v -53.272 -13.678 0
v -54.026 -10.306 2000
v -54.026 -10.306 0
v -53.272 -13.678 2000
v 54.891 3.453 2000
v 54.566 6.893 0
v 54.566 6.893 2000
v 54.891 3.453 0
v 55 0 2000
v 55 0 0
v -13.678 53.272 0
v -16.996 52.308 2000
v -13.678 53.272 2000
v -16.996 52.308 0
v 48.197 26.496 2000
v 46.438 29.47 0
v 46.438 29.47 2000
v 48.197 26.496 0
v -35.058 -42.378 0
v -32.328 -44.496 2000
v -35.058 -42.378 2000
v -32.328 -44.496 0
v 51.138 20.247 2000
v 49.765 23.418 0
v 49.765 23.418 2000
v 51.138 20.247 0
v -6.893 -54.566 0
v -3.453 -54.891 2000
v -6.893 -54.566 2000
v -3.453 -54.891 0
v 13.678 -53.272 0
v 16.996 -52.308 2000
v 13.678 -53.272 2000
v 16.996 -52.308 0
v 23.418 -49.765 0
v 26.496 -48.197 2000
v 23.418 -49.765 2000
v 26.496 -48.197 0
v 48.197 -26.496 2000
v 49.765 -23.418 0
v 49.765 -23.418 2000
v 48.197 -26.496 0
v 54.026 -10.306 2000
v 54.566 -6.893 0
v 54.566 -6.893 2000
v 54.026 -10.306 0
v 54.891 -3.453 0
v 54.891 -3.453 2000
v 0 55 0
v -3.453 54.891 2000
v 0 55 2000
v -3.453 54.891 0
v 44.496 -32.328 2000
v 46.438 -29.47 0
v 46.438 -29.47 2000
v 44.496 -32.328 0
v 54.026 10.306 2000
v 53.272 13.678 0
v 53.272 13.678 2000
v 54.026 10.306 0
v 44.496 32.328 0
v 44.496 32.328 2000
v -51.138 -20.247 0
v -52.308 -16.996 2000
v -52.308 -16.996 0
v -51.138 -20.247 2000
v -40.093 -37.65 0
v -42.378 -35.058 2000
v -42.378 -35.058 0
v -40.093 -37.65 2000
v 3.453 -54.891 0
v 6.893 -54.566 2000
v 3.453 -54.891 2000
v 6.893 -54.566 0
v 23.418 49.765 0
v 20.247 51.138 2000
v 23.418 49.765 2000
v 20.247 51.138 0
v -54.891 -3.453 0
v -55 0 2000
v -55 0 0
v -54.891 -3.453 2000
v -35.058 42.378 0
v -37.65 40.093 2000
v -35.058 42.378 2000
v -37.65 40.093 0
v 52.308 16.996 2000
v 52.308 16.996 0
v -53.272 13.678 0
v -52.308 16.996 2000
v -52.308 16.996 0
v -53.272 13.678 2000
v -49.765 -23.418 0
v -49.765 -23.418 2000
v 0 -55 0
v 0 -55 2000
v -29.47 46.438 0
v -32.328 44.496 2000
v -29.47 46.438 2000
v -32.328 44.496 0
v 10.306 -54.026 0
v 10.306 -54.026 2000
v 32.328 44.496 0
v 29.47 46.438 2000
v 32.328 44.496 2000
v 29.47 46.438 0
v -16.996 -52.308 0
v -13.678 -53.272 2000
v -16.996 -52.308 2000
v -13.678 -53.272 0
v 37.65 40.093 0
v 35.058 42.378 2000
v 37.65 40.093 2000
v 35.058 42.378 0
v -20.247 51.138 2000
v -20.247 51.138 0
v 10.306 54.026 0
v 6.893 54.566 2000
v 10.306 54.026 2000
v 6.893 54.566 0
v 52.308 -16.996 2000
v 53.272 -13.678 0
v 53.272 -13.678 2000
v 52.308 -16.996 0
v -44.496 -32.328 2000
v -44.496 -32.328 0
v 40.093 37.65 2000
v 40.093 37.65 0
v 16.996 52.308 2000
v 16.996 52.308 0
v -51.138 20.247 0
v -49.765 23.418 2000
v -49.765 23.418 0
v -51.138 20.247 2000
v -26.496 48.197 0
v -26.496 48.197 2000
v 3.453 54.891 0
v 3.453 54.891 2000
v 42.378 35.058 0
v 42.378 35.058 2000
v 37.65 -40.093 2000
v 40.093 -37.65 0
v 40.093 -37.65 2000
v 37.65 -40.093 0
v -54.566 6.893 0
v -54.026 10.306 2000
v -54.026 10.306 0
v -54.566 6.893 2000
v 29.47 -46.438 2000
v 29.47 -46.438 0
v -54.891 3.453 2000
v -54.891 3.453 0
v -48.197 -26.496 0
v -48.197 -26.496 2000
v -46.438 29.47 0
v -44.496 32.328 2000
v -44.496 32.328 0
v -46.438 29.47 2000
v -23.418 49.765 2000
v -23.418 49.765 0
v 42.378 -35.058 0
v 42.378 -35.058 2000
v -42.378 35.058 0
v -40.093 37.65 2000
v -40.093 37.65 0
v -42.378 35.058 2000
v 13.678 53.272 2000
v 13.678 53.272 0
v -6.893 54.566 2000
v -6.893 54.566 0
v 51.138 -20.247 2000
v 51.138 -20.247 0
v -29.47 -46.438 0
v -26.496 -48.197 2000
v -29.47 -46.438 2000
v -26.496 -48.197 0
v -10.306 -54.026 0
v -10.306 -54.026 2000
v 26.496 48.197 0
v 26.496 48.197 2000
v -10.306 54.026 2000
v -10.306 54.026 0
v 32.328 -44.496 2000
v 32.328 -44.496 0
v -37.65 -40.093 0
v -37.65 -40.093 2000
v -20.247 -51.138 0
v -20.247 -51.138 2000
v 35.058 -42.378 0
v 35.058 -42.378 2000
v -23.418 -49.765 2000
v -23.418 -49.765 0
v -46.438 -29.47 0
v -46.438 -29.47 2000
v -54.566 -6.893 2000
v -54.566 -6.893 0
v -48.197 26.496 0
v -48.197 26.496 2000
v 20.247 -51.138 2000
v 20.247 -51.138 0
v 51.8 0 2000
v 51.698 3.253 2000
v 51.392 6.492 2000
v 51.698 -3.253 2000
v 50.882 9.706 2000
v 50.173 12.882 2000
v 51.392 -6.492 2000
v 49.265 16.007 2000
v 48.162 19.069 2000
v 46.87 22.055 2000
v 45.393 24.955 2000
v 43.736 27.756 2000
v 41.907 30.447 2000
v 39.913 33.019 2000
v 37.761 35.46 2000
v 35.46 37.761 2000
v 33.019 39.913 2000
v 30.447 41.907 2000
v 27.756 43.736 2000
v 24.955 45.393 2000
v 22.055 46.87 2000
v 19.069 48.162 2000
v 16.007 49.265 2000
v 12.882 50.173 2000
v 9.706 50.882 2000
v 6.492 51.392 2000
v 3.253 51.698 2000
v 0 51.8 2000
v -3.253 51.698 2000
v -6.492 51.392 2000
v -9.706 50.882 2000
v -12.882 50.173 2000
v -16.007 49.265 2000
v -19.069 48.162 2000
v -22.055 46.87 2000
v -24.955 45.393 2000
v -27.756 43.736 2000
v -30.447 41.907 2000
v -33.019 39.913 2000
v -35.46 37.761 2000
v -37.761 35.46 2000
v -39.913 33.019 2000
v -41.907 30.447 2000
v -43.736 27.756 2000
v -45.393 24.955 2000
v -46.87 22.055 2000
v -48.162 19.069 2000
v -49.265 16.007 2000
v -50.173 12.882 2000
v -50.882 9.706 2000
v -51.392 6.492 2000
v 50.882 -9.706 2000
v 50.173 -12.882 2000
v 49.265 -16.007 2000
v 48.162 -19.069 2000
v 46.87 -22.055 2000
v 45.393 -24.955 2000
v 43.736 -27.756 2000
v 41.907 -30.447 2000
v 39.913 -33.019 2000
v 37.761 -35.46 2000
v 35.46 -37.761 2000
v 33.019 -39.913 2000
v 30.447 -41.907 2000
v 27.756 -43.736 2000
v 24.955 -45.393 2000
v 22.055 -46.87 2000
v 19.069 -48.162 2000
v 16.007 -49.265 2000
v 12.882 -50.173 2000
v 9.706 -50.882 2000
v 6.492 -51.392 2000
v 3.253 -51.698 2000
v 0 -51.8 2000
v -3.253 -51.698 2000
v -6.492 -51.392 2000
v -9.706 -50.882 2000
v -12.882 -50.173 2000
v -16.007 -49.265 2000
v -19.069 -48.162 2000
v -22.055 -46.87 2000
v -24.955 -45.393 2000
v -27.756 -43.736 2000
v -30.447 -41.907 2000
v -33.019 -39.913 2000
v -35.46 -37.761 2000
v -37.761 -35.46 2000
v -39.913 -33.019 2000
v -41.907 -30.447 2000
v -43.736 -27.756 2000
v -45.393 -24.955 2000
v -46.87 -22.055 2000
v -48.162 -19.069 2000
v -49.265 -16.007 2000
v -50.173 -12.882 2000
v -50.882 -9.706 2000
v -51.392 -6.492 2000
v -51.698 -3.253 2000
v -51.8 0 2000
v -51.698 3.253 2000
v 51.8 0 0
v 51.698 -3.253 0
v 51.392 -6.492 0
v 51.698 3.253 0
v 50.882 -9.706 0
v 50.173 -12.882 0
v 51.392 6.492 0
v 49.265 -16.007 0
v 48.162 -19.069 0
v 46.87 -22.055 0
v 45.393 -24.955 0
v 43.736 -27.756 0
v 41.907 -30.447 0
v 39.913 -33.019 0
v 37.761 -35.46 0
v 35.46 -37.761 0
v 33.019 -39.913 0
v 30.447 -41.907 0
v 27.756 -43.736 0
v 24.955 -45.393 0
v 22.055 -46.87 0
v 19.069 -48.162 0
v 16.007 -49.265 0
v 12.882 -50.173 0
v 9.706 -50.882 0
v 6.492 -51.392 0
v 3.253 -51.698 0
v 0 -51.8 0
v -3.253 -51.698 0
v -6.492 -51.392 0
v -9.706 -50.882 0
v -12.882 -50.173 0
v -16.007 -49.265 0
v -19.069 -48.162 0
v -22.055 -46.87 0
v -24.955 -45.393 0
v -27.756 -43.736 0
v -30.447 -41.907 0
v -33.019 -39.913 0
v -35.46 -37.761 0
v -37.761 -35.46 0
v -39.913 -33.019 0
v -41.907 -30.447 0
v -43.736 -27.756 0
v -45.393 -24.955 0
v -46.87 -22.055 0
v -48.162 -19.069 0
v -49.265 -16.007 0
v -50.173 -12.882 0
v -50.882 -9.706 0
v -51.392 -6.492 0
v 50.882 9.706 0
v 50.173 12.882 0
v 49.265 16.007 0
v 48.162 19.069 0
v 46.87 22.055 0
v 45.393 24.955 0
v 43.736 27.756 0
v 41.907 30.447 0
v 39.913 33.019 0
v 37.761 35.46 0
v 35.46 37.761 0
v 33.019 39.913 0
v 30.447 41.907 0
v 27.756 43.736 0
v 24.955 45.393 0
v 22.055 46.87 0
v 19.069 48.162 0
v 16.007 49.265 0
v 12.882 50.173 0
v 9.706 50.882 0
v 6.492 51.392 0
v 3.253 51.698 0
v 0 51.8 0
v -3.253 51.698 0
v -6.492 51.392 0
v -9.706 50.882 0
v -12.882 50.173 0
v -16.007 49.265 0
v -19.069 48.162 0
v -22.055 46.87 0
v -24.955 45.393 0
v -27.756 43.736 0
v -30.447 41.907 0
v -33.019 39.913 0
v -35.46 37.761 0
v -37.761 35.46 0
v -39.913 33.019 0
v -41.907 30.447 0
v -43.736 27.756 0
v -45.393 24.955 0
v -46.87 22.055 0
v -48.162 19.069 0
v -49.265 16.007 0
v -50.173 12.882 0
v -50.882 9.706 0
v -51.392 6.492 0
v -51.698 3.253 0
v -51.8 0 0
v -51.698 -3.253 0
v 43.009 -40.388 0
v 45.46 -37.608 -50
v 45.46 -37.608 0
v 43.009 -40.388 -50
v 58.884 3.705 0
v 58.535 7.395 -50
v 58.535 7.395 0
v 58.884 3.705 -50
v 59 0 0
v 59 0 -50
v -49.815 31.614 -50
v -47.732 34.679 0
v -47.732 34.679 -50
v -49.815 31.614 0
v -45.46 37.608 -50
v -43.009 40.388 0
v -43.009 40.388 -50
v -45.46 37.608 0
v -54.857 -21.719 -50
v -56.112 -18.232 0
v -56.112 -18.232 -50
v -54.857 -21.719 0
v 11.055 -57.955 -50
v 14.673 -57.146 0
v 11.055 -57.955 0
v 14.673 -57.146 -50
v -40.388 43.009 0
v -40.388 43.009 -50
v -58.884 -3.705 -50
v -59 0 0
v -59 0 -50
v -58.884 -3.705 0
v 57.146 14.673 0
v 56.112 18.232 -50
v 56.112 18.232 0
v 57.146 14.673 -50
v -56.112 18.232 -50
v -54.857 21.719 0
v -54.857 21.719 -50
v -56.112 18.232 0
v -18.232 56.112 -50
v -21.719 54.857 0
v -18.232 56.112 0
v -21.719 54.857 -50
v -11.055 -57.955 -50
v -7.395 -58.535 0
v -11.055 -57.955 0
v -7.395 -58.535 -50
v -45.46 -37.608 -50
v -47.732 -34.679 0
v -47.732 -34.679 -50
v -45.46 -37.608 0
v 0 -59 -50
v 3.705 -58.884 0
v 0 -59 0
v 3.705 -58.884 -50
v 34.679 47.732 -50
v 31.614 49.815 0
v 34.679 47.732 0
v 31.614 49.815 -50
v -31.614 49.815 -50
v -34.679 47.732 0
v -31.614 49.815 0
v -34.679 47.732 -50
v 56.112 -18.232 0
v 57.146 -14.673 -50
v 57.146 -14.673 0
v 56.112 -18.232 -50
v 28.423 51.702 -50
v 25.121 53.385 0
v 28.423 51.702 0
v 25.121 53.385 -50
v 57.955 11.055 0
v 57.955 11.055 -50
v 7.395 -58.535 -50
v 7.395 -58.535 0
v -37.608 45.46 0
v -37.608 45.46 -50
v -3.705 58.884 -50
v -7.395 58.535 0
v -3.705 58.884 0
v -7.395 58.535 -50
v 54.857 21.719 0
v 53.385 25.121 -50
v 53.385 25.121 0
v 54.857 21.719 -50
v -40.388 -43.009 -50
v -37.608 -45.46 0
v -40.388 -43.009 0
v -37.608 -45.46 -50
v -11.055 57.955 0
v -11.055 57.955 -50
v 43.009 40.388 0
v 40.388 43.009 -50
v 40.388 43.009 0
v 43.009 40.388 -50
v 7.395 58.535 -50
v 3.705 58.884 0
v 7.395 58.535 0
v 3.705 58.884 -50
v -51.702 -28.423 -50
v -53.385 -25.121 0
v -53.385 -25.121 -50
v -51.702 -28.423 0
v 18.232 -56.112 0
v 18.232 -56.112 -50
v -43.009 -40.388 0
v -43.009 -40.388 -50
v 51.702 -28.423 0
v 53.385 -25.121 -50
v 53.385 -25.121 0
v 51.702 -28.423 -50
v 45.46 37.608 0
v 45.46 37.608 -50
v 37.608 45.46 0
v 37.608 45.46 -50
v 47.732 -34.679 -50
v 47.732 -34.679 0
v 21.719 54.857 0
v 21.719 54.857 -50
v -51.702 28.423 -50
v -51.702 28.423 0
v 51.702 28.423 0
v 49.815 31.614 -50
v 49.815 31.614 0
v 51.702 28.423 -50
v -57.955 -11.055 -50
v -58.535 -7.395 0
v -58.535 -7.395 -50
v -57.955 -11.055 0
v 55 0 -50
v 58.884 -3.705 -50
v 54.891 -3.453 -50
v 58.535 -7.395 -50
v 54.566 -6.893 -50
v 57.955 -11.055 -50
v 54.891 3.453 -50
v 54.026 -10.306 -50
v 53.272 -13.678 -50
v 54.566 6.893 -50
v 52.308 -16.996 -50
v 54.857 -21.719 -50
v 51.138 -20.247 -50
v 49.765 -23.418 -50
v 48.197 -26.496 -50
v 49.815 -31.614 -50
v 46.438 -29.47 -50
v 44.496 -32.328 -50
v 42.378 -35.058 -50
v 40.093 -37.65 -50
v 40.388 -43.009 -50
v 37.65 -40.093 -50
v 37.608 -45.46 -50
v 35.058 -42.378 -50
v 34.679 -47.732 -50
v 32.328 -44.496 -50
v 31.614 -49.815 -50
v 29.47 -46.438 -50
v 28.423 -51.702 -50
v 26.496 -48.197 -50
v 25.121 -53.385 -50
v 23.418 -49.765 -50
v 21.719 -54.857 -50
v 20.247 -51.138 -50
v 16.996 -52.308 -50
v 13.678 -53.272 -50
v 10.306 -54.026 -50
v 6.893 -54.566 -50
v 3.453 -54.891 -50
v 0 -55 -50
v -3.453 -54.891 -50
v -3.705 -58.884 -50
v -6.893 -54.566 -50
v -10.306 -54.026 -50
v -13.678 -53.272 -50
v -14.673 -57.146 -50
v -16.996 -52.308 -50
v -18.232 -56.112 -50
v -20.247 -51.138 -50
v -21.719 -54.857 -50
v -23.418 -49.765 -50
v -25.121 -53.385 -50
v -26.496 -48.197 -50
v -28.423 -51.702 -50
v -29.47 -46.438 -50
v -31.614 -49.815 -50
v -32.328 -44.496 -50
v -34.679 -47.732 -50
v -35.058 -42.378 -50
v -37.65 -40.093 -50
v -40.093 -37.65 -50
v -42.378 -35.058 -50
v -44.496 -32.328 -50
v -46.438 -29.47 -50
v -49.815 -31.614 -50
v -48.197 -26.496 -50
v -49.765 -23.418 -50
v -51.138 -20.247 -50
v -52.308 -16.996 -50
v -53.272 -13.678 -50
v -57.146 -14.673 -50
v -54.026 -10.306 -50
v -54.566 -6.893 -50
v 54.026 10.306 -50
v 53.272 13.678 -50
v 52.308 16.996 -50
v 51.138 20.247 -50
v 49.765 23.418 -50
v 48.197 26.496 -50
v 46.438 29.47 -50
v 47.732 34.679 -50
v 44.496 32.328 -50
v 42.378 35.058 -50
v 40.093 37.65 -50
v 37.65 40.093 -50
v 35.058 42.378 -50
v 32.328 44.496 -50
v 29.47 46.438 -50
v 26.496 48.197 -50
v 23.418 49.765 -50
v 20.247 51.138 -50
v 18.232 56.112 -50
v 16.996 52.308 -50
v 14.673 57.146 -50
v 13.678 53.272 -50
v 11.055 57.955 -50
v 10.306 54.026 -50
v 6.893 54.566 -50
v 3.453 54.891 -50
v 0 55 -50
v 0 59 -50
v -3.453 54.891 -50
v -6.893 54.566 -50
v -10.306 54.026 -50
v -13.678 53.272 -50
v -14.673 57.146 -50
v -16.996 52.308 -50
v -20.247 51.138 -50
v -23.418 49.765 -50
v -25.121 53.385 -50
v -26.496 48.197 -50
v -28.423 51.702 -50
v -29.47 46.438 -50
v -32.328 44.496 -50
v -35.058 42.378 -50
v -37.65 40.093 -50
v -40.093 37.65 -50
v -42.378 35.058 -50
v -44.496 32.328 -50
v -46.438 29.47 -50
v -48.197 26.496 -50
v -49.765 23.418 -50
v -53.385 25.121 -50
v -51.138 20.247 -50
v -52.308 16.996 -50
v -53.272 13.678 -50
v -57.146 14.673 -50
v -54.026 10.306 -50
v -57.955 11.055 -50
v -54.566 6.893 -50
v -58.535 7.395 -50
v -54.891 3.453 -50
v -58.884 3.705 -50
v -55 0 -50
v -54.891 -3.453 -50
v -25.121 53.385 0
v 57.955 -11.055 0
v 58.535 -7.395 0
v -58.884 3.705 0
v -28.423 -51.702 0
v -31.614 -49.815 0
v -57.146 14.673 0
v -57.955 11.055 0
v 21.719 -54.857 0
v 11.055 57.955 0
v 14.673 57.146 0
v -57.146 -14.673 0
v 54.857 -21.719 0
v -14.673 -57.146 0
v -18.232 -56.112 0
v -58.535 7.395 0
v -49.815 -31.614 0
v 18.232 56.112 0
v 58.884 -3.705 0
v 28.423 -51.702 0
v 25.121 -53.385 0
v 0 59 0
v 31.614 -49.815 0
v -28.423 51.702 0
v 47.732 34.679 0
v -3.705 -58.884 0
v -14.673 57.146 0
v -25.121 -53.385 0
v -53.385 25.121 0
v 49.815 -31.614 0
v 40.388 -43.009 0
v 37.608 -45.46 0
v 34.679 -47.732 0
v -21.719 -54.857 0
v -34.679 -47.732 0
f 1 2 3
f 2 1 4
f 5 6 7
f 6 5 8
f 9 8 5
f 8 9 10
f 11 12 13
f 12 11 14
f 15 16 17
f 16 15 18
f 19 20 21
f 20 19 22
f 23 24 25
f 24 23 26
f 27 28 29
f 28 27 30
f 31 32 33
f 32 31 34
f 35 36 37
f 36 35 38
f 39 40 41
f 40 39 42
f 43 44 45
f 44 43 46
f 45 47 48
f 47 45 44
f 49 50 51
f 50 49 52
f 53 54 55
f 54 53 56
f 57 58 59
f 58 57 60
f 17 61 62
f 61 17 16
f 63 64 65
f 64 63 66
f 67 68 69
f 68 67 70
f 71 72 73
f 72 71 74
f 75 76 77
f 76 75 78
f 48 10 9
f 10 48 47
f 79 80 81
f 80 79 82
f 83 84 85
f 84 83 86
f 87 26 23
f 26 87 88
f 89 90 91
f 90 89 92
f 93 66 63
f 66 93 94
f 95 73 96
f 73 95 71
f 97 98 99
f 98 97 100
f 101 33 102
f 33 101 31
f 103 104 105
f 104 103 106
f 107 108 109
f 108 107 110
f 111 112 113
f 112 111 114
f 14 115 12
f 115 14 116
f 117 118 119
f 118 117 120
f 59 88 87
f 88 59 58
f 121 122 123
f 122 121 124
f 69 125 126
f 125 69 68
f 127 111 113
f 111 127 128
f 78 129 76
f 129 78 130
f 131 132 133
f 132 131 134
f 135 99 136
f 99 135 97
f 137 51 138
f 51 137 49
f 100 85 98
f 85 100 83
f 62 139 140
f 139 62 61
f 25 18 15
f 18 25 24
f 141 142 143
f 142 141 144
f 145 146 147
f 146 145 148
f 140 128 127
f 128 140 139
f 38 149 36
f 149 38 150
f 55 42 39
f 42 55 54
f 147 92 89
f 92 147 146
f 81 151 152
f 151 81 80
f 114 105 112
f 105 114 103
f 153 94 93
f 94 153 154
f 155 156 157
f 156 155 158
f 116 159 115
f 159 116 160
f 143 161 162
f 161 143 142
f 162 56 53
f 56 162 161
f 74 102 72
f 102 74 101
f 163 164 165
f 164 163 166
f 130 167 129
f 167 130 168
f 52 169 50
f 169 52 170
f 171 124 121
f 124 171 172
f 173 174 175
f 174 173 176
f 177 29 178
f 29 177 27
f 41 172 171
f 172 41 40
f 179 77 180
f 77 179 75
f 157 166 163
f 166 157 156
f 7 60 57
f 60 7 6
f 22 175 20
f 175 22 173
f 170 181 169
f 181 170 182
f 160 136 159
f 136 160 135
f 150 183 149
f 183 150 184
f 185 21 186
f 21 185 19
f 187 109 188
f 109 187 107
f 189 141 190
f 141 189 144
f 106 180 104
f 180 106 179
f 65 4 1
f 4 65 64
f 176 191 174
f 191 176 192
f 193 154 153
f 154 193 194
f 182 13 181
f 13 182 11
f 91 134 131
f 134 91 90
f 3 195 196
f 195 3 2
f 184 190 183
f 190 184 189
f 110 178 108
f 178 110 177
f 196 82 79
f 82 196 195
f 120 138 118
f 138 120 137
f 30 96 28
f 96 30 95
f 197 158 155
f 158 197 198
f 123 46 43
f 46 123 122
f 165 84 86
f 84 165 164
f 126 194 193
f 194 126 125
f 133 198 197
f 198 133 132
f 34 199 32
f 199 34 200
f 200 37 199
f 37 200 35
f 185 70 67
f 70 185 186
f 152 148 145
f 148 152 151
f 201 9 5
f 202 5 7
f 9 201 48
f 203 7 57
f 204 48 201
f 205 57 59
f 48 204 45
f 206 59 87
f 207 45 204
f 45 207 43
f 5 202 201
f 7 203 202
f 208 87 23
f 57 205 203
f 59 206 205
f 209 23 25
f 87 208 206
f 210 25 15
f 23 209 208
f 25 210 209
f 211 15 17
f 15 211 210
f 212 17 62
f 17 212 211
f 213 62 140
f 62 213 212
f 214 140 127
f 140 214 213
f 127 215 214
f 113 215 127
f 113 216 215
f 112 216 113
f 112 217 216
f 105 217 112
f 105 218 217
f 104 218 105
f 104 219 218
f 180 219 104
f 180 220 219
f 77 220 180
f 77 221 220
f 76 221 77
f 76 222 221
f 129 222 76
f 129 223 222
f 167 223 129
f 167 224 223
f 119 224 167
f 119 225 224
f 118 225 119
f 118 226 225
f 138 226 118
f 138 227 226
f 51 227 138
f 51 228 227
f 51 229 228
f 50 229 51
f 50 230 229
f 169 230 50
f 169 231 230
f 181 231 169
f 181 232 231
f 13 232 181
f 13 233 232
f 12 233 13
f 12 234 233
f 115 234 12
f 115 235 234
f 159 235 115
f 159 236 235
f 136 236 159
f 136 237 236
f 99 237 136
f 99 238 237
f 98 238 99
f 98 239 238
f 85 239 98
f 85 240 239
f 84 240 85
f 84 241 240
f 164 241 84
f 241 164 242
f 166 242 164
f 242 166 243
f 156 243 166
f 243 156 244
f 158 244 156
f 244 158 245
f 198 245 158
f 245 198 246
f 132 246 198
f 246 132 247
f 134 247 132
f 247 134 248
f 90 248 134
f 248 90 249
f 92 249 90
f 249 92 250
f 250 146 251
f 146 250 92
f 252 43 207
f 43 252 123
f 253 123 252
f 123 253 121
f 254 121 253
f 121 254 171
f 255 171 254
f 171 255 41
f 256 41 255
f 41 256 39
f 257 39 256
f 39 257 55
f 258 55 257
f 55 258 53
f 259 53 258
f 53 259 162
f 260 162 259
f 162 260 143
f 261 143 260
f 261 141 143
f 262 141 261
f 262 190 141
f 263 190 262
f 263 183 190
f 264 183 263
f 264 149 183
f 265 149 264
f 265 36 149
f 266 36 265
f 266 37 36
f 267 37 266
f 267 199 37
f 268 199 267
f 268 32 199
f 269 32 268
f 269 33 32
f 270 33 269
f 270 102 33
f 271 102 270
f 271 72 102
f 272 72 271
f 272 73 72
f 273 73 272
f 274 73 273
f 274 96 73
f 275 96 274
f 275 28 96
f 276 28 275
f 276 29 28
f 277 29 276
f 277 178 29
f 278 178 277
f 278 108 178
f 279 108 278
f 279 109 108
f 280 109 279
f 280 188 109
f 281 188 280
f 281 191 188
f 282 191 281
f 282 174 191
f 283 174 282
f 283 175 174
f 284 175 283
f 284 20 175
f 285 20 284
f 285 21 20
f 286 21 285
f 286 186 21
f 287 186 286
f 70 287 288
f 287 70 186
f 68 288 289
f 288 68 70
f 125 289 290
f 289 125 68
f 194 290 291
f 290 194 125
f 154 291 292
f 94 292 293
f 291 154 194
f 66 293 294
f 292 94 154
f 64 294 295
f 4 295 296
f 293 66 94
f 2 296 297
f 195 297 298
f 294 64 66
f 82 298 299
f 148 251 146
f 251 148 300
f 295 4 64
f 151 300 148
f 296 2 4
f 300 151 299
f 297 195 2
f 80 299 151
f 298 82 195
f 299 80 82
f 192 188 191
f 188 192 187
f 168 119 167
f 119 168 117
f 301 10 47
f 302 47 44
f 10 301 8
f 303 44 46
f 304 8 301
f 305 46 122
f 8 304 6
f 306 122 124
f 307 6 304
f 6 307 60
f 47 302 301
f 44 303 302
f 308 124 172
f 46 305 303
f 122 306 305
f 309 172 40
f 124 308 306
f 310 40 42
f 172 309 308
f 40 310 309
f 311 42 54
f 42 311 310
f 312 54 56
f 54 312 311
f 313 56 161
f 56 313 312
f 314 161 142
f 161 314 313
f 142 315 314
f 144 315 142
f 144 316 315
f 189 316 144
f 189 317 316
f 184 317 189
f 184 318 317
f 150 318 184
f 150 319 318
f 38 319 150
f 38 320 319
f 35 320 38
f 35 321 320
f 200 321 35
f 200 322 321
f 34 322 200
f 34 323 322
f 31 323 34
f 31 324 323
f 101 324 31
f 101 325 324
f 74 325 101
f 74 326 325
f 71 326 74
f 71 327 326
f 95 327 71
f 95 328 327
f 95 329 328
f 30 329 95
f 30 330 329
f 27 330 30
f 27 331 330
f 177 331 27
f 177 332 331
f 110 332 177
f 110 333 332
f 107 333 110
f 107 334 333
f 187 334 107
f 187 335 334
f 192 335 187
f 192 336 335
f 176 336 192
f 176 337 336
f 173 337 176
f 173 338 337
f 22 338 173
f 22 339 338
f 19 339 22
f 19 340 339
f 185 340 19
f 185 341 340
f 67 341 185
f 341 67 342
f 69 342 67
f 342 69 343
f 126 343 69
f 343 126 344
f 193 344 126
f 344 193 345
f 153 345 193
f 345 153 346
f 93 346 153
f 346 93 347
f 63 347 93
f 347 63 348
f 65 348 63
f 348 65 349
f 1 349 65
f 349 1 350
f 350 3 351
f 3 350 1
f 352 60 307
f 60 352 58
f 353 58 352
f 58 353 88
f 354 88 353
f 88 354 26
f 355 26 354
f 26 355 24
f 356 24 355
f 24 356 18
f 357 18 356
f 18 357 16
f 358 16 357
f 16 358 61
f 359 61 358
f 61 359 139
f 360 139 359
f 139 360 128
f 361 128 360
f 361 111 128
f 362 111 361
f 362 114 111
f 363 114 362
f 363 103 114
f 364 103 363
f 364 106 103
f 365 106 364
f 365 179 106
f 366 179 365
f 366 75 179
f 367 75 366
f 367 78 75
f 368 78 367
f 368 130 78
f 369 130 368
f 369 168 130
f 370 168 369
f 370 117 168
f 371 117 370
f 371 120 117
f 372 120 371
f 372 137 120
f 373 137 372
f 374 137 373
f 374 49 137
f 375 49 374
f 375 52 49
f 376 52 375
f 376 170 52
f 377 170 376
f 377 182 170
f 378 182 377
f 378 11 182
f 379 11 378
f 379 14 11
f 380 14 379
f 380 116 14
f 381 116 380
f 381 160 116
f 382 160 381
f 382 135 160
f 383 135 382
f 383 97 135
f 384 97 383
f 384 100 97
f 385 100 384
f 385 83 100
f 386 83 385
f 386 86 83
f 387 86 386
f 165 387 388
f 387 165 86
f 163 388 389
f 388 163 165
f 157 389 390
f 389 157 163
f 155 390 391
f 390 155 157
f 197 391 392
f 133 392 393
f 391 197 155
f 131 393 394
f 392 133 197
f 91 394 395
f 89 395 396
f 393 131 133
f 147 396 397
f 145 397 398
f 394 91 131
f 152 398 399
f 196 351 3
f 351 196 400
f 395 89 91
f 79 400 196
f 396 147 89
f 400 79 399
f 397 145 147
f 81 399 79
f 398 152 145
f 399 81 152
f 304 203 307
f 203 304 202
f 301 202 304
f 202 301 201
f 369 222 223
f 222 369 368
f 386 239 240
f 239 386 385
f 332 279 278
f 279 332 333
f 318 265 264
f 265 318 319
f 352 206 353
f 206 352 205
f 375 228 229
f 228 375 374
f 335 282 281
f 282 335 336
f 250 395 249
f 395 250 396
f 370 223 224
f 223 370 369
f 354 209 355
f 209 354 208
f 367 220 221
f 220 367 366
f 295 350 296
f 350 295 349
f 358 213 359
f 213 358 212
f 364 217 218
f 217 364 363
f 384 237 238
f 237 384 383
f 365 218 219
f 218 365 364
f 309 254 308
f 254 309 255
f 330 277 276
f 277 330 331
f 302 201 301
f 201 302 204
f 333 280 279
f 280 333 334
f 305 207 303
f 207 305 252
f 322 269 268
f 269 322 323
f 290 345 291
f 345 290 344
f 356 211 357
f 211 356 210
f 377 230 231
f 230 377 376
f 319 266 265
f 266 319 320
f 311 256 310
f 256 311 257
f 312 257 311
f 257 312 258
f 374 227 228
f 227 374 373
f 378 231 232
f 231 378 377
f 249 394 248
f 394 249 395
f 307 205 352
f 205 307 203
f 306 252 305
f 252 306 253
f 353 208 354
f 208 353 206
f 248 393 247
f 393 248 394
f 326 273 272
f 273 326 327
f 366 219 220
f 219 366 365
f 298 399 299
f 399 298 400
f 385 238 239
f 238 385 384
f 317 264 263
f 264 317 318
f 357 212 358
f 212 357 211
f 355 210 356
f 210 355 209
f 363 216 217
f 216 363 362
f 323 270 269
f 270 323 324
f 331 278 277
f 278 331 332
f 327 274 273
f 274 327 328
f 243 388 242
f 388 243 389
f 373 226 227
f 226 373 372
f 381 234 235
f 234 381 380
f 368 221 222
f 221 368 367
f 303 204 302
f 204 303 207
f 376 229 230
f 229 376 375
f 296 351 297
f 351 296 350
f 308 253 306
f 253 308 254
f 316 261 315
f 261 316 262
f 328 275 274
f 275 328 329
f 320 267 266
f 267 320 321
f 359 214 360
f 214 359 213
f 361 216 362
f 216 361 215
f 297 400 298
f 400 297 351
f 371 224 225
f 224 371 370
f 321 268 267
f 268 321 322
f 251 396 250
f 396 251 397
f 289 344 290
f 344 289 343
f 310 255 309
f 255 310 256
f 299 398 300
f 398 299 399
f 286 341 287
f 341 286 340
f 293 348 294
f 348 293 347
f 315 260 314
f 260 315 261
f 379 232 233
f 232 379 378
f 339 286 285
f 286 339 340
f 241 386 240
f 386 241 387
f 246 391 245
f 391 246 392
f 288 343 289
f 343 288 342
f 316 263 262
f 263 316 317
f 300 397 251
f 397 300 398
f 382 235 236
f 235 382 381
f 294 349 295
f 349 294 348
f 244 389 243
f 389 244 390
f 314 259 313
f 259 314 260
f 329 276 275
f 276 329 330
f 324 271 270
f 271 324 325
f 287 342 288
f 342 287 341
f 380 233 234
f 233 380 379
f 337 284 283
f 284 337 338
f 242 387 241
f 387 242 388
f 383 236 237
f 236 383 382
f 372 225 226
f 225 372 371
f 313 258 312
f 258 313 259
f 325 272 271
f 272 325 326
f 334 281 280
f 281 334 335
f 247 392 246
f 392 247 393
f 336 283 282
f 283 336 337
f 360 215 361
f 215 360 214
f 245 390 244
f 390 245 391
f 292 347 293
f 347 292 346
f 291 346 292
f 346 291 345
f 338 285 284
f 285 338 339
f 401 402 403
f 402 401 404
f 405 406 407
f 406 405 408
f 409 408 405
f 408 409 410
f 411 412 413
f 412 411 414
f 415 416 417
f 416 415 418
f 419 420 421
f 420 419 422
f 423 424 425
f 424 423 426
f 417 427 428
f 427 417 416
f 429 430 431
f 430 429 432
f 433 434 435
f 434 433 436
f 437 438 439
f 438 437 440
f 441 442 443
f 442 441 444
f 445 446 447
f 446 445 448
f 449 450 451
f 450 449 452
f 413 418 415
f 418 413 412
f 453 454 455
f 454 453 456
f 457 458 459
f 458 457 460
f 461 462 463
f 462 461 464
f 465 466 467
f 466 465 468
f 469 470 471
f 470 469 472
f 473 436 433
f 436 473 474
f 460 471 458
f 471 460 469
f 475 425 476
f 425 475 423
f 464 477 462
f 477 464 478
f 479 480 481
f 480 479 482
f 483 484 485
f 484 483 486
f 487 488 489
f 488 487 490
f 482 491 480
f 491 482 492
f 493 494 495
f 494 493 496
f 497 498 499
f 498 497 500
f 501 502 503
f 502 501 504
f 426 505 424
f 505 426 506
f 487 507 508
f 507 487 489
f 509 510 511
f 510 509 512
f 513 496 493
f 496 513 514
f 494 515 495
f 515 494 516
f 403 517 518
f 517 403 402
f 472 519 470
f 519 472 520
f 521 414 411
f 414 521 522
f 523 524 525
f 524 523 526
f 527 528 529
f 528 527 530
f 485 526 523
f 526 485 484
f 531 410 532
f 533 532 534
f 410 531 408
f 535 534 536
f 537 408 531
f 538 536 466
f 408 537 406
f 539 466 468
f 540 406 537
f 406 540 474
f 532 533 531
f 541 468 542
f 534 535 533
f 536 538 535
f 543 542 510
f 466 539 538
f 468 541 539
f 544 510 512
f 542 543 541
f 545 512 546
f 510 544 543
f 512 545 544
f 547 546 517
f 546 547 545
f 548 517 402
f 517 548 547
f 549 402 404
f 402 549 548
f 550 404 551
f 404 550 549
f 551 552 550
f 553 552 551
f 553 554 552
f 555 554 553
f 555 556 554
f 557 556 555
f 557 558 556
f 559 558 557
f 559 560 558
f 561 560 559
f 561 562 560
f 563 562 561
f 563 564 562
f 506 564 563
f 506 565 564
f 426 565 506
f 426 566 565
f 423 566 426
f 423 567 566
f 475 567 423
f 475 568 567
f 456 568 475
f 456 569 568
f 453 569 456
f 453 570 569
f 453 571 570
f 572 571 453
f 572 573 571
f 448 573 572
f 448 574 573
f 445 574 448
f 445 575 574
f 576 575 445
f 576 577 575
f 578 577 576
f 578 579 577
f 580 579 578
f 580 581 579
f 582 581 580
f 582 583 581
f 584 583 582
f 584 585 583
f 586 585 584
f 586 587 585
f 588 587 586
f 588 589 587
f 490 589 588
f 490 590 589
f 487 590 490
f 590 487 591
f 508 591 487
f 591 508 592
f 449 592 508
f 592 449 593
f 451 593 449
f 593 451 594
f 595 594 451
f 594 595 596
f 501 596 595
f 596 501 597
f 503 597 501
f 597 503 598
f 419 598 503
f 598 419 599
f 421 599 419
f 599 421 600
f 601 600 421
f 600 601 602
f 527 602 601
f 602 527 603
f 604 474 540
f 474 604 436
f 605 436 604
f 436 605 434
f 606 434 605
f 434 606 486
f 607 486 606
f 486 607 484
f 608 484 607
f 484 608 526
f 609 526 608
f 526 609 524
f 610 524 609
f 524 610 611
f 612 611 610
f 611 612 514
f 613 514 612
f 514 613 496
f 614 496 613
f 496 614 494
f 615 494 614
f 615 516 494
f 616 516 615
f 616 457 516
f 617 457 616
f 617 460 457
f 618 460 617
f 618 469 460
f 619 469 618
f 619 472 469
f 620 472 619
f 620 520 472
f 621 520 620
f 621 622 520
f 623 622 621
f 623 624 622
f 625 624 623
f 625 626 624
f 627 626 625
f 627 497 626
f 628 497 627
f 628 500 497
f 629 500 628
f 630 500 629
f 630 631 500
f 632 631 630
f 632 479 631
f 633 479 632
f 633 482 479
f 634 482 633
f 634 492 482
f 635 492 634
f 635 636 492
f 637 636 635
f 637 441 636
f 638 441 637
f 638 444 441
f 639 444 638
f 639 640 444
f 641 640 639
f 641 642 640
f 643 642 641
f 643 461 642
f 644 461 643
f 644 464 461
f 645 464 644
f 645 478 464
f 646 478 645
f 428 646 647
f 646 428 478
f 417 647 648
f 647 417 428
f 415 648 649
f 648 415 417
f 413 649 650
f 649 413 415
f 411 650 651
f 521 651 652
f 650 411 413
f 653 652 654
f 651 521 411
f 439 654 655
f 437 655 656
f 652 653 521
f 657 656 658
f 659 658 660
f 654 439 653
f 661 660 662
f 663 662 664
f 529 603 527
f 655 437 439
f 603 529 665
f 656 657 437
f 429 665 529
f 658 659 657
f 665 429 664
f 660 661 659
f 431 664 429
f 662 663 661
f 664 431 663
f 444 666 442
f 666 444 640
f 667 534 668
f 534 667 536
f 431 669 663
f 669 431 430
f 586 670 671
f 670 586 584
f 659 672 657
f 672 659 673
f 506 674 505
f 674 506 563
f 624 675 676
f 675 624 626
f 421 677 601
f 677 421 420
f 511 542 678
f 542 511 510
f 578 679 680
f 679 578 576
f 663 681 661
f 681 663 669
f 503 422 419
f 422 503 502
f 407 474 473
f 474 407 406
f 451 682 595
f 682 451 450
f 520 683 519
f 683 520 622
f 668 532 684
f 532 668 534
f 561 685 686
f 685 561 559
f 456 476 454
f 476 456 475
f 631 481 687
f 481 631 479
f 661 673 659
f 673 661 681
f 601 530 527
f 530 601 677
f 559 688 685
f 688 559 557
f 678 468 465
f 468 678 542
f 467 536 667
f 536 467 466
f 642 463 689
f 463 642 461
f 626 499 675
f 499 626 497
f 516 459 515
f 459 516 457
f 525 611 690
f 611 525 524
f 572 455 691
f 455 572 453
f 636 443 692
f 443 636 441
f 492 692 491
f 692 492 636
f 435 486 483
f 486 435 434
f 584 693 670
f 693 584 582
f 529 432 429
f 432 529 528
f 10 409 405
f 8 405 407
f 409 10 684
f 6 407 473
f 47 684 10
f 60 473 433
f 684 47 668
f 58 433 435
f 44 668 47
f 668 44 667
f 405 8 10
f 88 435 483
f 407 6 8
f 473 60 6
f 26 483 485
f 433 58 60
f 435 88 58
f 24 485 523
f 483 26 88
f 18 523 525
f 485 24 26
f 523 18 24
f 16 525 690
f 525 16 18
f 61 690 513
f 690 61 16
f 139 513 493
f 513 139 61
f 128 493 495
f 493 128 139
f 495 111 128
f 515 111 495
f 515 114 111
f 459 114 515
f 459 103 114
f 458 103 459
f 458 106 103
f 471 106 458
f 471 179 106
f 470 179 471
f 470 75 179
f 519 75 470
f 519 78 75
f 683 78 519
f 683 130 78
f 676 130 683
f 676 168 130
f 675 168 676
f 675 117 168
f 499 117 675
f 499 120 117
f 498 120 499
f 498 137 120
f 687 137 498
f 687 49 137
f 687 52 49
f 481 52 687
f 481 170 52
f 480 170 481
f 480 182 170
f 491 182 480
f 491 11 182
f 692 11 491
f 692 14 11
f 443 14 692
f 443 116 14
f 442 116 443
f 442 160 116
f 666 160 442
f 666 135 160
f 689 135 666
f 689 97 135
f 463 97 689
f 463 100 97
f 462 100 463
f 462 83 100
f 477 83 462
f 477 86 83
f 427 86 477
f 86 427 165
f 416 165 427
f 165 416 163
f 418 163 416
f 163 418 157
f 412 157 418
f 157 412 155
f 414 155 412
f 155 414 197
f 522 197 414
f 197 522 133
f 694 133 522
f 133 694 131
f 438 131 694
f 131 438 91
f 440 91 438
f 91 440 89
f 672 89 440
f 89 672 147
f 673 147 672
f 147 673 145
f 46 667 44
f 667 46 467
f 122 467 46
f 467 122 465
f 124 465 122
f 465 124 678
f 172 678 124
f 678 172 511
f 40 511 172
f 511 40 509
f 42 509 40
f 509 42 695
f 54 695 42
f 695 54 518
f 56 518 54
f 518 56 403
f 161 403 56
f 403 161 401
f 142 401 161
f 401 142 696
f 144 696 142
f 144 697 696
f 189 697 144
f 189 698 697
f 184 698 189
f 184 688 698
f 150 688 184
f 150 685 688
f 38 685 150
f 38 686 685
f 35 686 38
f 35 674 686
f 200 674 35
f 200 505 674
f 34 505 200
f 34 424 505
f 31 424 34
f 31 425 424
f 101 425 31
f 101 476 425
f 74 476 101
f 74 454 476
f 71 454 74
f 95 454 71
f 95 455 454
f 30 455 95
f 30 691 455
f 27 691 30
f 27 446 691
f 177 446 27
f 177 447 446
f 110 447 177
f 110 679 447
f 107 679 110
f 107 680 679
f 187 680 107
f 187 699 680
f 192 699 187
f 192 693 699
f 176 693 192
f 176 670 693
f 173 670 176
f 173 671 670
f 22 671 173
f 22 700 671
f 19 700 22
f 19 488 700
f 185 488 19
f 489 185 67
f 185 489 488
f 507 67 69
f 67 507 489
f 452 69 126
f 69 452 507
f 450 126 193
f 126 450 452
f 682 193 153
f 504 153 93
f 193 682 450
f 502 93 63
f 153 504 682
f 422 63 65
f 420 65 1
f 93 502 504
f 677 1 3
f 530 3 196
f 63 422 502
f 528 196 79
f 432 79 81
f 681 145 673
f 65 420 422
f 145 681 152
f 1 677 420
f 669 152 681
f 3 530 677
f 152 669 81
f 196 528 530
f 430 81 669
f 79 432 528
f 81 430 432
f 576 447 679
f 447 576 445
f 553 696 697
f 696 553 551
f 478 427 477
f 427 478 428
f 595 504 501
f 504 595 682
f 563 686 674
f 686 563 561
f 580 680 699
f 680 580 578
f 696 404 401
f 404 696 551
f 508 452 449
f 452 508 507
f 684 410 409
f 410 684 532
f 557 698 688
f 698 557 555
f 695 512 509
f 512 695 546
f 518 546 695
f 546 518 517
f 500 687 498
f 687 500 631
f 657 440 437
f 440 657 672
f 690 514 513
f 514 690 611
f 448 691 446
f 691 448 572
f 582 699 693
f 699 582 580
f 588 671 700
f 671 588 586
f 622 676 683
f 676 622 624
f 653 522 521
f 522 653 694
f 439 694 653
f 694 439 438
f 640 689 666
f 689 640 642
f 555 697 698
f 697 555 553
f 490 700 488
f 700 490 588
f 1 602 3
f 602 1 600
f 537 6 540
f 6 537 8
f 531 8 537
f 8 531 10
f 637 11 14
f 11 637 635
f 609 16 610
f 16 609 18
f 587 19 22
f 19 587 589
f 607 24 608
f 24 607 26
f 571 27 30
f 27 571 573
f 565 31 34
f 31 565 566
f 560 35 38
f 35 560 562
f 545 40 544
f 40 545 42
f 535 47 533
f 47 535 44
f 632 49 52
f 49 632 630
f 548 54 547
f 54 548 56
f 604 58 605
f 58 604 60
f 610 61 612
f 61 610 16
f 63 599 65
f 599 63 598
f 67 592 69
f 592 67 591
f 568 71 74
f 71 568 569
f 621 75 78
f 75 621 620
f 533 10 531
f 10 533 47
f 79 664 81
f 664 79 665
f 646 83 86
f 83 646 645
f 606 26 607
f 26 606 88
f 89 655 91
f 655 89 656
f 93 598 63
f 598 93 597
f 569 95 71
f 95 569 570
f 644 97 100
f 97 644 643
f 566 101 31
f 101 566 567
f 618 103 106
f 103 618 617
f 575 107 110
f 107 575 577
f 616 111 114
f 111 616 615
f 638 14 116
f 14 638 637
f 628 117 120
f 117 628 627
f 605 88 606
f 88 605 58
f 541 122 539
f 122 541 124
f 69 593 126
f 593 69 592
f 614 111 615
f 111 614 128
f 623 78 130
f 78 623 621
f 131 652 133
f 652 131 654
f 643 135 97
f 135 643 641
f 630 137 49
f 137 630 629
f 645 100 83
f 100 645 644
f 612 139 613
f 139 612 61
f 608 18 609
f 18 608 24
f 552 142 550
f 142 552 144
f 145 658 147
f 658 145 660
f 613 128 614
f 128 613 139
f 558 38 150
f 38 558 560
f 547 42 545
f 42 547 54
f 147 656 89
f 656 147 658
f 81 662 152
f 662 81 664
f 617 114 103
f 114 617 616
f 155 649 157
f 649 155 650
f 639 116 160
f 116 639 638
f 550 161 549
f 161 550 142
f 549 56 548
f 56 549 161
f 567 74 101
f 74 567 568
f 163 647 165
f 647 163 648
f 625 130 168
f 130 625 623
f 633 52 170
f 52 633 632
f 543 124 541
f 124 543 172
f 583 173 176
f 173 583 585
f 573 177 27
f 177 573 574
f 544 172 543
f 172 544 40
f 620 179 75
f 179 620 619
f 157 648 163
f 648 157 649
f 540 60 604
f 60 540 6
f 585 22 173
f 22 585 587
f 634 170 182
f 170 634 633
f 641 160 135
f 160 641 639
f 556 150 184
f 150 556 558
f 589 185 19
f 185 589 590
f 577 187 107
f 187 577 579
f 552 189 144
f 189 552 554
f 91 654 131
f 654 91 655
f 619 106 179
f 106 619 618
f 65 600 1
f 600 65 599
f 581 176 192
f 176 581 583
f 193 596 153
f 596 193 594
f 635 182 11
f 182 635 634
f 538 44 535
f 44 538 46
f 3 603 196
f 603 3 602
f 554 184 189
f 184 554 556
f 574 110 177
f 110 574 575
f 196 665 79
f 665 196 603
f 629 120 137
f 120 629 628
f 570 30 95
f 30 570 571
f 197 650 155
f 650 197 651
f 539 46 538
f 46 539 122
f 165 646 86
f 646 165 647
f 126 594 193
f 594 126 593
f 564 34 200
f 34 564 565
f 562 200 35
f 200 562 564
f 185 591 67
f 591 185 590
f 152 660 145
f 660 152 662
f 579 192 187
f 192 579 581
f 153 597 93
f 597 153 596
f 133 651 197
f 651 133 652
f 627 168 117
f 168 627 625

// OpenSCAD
// HT 110 pipe specifications
module ht_pipe_segment(length = 2000) {
    ht_pipe(length);
    integrated_end_fitting();
}

// HT 110 pipe module
module ht_pipe(length) {
    outer_diameter = 110; // Outer diameter for HT 110
    wall_thickness = 3.2; // Typical wall thickness for HT 110
    inner_diameter = outer_diameter - 2 * wall_thickness;
    
    difference() {
        cylinder(h = length, d = outer_diameter, $fn = 100);
        translate([0, 0, -1]) // Slightly extend inner cylinder for clean subtraction
            cylinder(h = length + 2, d = inner_diameter, $fn = 100);
    }
}

// Integrated end fitting module
module integrated_end_fitting() {
    outer_diameter = 110; // Outer diameter for HT 110
    fitting_length = 50; // Typical length for end fitting
    fitting_thickness = 4; // Typical thickness for end fitting
    
    translate([0, 0, -fitting_length])
        difference() {
            cylinder(h = fitting_length, d = outer_diameter + 2 * fitting_thickness, $fn = 100);
            translate([0, 0, -1]) // Slightly extend inner cylinder for clean subtraction
                cylinder(h = fitting_length + 2, d = outer_diameter, $fn = 100);
        }
}

// Render the HT 110 pipe segment
ht_pipe_segment();
